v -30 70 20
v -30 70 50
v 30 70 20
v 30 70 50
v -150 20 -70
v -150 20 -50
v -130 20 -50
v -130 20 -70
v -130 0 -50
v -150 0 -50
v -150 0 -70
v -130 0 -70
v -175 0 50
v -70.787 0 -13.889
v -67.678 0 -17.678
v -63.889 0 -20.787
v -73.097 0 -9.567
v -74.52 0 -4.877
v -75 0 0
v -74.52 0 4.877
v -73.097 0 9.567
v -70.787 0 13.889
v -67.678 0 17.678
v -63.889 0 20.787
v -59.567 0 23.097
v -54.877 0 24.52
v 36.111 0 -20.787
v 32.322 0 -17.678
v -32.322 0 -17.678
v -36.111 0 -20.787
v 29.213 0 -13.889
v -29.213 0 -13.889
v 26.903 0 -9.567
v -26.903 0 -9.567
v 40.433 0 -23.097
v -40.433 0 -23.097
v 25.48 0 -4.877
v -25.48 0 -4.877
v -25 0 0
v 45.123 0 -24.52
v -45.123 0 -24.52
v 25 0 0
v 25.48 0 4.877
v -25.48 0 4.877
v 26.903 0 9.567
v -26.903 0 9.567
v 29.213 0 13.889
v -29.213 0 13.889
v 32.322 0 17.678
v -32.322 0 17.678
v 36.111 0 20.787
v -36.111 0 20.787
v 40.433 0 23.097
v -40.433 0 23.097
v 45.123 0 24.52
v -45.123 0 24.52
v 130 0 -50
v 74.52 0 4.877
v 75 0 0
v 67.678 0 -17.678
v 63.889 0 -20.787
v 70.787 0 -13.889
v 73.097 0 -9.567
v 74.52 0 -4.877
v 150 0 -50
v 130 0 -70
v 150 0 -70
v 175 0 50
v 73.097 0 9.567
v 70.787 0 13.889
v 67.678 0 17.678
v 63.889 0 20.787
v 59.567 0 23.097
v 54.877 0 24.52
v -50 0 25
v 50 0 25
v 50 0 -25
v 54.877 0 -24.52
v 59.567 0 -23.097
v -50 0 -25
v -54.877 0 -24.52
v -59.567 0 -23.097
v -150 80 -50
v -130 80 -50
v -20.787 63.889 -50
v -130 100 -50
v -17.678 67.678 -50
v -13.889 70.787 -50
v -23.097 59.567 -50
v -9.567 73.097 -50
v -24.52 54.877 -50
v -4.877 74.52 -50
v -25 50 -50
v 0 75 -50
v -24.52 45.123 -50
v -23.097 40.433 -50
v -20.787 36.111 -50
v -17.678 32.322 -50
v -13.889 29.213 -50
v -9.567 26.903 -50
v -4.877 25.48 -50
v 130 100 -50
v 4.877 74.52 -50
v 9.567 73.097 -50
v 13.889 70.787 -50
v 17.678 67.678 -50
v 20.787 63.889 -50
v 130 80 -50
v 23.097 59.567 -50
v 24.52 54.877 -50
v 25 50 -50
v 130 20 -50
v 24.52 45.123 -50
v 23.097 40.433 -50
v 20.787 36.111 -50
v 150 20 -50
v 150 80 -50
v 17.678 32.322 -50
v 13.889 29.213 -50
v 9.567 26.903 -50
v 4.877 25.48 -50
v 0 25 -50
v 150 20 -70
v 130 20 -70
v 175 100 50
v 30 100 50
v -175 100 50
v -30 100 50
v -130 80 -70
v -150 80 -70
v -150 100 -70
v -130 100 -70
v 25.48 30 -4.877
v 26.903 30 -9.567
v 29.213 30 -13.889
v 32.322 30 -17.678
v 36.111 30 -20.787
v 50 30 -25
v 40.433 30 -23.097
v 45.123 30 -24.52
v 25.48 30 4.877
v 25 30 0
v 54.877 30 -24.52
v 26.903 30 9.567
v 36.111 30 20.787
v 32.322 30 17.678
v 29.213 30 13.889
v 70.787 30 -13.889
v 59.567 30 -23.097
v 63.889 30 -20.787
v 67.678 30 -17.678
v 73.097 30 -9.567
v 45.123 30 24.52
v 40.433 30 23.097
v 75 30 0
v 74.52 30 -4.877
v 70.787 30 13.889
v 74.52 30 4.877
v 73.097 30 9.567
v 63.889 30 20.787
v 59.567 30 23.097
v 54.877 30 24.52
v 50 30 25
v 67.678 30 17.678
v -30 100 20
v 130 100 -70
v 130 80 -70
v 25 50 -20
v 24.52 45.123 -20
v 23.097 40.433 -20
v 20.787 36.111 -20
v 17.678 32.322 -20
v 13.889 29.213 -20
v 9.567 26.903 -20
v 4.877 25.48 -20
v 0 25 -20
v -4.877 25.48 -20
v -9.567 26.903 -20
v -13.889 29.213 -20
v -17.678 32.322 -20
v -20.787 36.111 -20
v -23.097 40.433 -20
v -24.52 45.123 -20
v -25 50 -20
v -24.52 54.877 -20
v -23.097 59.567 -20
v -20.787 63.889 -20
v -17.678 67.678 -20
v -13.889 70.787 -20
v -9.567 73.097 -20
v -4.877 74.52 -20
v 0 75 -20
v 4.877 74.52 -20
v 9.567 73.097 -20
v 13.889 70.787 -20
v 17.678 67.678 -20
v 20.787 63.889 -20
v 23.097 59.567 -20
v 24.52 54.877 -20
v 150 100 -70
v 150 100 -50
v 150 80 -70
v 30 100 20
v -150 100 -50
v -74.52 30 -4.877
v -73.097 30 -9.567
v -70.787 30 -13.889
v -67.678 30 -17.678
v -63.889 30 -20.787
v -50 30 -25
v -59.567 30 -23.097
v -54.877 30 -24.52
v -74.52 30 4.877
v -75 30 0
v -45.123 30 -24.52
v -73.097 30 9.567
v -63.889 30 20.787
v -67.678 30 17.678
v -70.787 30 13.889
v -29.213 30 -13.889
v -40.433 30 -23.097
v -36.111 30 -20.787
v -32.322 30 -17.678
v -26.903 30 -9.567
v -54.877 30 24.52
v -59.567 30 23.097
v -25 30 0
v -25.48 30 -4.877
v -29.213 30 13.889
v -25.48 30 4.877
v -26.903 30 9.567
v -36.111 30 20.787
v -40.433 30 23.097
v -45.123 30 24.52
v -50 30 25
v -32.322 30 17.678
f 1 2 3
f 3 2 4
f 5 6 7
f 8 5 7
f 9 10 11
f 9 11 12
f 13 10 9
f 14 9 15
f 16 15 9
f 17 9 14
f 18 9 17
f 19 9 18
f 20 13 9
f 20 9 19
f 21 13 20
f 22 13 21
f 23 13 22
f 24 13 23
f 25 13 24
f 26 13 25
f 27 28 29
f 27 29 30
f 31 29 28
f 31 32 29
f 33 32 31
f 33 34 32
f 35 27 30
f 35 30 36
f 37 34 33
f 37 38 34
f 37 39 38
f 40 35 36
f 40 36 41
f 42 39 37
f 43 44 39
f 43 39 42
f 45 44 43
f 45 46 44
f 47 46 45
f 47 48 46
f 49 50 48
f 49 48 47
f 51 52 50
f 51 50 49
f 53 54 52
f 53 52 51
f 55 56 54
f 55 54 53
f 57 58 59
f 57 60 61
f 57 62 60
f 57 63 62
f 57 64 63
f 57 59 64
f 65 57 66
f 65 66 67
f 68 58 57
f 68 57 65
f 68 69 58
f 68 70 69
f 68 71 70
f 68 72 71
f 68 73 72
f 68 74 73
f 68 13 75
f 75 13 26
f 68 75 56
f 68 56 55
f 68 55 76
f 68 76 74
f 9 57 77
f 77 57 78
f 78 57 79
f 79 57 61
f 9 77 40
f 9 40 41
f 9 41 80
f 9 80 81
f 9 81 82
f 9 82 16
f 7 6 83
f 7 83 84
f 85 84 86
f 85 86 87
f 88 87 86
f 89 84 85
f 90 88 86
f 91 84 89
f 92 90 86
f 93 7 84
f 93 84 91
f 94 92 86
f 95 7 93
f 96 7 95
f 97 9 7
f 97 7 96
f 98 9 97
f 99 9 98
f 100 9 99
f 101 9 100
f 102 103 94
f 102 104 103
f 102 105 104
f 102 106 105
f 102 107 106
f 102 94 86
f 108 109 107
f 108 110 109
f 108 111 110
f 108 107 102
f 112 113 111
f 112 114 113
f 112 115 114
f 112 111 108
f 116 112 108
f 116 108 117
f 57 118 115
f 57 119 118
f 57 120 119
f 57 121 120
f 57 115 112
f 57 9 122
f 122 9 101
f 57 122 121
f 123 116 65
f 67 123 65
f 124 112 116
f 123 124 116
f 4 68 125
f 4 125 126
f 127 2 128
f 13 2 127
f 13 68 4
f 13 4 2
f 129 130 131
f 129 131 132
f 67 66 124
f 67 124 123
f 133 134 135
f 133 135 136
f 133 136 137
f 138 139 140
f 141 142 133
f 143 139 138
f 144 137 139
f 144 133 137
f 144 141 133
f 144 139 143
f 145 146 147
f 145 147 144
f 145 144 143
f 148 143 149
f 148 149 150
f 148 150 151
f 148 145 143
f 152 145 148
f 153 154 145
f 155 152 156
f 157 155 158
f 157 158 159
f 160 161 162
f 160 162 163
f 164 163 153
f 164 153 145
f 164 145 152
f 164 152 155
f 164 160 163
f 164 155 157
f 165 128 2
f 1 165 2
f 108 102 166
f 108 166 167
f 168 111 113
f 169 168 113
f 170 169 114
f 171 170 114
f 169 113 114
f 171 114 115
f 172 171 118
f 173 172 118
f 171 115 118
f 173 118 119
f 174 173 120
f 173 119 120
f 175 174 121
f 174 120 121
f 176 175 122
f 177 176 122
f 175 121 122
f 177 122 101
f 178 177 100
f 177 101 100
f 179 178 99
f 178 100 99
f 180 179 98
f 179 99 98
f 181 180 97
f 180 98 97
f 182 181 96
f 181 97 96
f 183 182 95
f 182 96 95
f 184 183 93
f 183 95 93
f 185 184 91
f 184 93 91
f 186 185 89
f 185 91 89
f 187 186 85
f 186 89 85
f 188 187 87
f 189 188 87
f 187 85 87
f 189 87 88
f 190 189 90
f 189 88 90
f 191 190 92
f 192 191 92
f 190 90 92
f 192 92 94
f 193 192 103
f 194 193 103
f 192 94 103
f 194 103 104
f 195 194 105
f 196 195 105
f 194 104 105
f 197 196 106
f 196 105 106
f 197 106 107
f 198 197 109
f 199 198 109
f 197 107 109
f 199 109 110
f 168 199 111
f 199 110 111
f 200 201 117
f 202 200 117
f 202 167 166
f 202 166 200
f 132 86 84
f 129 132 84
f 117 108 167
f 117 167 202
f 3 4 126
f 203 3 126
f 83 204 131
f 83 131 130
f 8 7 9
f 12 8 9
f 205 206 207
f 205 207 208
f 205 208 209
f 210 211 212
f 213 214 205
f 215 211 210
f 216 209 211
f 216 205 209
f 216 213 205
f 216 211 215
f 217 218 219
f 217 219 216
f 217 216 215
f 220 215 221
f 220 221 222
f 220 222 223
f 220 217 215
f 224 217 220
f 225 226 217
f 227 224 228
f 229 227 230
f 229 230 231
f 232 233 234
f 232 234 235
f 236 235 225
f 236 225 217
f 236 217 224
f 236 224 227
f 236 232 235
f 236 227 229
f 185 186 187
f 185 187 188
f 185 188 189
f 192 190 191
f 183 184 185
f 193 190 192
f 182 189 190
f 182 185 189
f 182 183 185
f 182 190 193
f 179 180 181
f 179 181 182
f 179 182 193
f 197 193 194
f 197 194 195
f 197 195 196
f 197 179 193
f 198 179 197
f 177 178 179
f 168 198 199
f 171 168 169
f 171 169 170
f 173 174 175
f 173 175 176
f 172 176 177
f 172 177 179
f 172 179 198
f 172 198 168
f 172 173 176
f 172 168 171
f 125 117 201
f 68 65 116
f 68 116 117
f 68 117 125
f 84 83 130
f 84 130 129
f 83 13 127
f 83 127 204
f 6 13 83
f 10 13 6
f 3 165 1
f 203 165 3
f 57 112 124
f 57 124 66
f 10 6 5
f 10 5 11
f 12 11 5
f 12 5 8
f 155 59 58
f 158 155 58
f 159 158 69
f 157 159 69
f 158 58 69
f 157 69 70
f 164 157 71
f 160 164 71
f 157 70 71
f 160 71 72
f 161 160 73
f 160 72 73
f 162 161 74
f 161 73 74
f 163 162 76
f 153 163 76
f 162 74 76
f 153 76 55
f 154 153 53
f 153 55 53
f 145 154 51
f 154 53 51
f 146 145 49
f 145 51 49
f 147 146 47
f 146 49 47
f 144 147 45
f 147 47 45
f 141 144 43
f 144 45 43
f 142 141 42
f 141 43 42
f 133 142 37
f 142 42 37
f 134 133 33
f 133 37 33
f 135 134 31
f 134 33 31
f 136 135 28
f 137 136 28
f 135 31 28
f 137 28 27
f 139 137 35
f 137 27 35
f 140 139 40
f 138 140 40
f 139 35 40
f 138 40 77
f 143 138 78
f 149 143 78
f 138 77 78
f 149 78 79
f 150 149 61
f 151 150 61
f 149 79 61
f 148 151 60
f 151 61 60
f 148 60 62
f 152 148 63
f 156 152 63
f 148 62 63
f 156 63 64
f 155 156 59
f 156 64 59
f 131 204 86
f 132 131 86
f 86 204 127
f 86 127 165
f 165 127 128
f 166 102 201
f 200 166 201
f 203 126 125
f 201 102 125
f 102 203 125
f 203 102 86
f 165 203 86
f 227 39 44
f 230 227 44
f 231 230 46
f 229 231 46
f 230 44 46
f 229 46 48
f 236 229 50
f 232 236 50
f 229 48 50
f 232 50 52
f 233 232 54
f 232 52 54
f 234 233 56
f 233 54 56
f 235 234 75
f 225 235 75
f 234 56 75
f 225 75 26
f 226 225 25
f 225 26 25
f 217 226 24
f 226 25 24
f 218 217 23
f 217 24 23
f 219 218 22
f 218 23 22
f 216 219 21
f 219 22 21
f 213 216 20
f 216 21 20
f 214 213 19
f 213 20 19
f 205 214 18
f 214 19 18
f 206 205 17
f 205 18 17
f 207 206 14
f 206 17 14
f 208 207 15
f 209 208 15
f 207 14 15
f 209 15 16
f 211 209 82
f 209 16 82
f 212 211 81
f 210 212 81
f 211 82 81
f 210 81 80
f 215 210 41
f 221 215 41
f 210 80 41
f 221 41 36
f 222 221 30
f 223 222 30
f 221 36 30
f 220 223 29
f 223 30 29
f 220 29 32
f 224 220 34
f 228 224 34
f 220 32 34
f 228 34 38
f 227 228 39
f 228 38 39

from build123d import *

# Parameters (mm, degrees)
F1_DEPTH  = 100
F2_R      = 25
F3_DEPTH  = 30
F4_R      = 25
F5_DEPTH  = 30
F7_DEPTH  = 30
F10_W     = 20
F10_H     = 20
F11_DEPTH = 20


with BuildPart() as f1:
    # F0 (on Front) → F1 (new body)
    with BuildSketch(Plane.XZ):
        Polygon((-150, -50), (150, -50), (175, 50), (150, 50), (-150, 50), (-175, 50), align=None)
    extrude(amount=-F1_DEPTH)

    # F2 (on face) → F3 (cut)
    with BuildSketch(Plane.XZ):
        with Locations((50, 0)):
            Circle(F2_R)
        with Locations((-50, 0)):
            Circle(F2_R)
    extrude(amount=-F3_DEPTH, mode=Mode.SUBTRACT)

    # F4 (on face) → F5 (cut)
    with BuildSketch(Plane(origin=(0, 0, -50), x_dir=(1, 0, 0), z_dir=(0, 0, -1))):
        with Locations((0, -50)):
            Circle(F4_R)
    extrude(amount=-F5_DEPTH, mode=Mode.SUBTRACT)

    # F6 (on face) → F7 (cut)
    with BuildSketch(Plane.XY.offset(50)):
        Polygon((30, 100), (0, 100), (-30, 100), (-30, 70), (30, 70), align=None)
    extrude(amount=-F7_DEPTH, mode=Mode.SUBTRACT)

    # F10 (on face) → F11 (join)
    with BuildSketch(Plane(origin=(0, 0, -50), x_dir=(1, 0, 0), z_dir=(0, 0, -1))):
        with Locations((140, -10)):
            Rectangle(F10_W, F10_H)
        with Locations((140, -90)):
            Rectangle(F10_W, F10_H)
        with Locations((-140, -90)):
            Rectangle(F10_W, F10_H)
        with Locations((-140, -10)):
            Rectangle(F10_W, F10_H)
    extrude(amount=F11_DEPTH)


solid = f1.part
